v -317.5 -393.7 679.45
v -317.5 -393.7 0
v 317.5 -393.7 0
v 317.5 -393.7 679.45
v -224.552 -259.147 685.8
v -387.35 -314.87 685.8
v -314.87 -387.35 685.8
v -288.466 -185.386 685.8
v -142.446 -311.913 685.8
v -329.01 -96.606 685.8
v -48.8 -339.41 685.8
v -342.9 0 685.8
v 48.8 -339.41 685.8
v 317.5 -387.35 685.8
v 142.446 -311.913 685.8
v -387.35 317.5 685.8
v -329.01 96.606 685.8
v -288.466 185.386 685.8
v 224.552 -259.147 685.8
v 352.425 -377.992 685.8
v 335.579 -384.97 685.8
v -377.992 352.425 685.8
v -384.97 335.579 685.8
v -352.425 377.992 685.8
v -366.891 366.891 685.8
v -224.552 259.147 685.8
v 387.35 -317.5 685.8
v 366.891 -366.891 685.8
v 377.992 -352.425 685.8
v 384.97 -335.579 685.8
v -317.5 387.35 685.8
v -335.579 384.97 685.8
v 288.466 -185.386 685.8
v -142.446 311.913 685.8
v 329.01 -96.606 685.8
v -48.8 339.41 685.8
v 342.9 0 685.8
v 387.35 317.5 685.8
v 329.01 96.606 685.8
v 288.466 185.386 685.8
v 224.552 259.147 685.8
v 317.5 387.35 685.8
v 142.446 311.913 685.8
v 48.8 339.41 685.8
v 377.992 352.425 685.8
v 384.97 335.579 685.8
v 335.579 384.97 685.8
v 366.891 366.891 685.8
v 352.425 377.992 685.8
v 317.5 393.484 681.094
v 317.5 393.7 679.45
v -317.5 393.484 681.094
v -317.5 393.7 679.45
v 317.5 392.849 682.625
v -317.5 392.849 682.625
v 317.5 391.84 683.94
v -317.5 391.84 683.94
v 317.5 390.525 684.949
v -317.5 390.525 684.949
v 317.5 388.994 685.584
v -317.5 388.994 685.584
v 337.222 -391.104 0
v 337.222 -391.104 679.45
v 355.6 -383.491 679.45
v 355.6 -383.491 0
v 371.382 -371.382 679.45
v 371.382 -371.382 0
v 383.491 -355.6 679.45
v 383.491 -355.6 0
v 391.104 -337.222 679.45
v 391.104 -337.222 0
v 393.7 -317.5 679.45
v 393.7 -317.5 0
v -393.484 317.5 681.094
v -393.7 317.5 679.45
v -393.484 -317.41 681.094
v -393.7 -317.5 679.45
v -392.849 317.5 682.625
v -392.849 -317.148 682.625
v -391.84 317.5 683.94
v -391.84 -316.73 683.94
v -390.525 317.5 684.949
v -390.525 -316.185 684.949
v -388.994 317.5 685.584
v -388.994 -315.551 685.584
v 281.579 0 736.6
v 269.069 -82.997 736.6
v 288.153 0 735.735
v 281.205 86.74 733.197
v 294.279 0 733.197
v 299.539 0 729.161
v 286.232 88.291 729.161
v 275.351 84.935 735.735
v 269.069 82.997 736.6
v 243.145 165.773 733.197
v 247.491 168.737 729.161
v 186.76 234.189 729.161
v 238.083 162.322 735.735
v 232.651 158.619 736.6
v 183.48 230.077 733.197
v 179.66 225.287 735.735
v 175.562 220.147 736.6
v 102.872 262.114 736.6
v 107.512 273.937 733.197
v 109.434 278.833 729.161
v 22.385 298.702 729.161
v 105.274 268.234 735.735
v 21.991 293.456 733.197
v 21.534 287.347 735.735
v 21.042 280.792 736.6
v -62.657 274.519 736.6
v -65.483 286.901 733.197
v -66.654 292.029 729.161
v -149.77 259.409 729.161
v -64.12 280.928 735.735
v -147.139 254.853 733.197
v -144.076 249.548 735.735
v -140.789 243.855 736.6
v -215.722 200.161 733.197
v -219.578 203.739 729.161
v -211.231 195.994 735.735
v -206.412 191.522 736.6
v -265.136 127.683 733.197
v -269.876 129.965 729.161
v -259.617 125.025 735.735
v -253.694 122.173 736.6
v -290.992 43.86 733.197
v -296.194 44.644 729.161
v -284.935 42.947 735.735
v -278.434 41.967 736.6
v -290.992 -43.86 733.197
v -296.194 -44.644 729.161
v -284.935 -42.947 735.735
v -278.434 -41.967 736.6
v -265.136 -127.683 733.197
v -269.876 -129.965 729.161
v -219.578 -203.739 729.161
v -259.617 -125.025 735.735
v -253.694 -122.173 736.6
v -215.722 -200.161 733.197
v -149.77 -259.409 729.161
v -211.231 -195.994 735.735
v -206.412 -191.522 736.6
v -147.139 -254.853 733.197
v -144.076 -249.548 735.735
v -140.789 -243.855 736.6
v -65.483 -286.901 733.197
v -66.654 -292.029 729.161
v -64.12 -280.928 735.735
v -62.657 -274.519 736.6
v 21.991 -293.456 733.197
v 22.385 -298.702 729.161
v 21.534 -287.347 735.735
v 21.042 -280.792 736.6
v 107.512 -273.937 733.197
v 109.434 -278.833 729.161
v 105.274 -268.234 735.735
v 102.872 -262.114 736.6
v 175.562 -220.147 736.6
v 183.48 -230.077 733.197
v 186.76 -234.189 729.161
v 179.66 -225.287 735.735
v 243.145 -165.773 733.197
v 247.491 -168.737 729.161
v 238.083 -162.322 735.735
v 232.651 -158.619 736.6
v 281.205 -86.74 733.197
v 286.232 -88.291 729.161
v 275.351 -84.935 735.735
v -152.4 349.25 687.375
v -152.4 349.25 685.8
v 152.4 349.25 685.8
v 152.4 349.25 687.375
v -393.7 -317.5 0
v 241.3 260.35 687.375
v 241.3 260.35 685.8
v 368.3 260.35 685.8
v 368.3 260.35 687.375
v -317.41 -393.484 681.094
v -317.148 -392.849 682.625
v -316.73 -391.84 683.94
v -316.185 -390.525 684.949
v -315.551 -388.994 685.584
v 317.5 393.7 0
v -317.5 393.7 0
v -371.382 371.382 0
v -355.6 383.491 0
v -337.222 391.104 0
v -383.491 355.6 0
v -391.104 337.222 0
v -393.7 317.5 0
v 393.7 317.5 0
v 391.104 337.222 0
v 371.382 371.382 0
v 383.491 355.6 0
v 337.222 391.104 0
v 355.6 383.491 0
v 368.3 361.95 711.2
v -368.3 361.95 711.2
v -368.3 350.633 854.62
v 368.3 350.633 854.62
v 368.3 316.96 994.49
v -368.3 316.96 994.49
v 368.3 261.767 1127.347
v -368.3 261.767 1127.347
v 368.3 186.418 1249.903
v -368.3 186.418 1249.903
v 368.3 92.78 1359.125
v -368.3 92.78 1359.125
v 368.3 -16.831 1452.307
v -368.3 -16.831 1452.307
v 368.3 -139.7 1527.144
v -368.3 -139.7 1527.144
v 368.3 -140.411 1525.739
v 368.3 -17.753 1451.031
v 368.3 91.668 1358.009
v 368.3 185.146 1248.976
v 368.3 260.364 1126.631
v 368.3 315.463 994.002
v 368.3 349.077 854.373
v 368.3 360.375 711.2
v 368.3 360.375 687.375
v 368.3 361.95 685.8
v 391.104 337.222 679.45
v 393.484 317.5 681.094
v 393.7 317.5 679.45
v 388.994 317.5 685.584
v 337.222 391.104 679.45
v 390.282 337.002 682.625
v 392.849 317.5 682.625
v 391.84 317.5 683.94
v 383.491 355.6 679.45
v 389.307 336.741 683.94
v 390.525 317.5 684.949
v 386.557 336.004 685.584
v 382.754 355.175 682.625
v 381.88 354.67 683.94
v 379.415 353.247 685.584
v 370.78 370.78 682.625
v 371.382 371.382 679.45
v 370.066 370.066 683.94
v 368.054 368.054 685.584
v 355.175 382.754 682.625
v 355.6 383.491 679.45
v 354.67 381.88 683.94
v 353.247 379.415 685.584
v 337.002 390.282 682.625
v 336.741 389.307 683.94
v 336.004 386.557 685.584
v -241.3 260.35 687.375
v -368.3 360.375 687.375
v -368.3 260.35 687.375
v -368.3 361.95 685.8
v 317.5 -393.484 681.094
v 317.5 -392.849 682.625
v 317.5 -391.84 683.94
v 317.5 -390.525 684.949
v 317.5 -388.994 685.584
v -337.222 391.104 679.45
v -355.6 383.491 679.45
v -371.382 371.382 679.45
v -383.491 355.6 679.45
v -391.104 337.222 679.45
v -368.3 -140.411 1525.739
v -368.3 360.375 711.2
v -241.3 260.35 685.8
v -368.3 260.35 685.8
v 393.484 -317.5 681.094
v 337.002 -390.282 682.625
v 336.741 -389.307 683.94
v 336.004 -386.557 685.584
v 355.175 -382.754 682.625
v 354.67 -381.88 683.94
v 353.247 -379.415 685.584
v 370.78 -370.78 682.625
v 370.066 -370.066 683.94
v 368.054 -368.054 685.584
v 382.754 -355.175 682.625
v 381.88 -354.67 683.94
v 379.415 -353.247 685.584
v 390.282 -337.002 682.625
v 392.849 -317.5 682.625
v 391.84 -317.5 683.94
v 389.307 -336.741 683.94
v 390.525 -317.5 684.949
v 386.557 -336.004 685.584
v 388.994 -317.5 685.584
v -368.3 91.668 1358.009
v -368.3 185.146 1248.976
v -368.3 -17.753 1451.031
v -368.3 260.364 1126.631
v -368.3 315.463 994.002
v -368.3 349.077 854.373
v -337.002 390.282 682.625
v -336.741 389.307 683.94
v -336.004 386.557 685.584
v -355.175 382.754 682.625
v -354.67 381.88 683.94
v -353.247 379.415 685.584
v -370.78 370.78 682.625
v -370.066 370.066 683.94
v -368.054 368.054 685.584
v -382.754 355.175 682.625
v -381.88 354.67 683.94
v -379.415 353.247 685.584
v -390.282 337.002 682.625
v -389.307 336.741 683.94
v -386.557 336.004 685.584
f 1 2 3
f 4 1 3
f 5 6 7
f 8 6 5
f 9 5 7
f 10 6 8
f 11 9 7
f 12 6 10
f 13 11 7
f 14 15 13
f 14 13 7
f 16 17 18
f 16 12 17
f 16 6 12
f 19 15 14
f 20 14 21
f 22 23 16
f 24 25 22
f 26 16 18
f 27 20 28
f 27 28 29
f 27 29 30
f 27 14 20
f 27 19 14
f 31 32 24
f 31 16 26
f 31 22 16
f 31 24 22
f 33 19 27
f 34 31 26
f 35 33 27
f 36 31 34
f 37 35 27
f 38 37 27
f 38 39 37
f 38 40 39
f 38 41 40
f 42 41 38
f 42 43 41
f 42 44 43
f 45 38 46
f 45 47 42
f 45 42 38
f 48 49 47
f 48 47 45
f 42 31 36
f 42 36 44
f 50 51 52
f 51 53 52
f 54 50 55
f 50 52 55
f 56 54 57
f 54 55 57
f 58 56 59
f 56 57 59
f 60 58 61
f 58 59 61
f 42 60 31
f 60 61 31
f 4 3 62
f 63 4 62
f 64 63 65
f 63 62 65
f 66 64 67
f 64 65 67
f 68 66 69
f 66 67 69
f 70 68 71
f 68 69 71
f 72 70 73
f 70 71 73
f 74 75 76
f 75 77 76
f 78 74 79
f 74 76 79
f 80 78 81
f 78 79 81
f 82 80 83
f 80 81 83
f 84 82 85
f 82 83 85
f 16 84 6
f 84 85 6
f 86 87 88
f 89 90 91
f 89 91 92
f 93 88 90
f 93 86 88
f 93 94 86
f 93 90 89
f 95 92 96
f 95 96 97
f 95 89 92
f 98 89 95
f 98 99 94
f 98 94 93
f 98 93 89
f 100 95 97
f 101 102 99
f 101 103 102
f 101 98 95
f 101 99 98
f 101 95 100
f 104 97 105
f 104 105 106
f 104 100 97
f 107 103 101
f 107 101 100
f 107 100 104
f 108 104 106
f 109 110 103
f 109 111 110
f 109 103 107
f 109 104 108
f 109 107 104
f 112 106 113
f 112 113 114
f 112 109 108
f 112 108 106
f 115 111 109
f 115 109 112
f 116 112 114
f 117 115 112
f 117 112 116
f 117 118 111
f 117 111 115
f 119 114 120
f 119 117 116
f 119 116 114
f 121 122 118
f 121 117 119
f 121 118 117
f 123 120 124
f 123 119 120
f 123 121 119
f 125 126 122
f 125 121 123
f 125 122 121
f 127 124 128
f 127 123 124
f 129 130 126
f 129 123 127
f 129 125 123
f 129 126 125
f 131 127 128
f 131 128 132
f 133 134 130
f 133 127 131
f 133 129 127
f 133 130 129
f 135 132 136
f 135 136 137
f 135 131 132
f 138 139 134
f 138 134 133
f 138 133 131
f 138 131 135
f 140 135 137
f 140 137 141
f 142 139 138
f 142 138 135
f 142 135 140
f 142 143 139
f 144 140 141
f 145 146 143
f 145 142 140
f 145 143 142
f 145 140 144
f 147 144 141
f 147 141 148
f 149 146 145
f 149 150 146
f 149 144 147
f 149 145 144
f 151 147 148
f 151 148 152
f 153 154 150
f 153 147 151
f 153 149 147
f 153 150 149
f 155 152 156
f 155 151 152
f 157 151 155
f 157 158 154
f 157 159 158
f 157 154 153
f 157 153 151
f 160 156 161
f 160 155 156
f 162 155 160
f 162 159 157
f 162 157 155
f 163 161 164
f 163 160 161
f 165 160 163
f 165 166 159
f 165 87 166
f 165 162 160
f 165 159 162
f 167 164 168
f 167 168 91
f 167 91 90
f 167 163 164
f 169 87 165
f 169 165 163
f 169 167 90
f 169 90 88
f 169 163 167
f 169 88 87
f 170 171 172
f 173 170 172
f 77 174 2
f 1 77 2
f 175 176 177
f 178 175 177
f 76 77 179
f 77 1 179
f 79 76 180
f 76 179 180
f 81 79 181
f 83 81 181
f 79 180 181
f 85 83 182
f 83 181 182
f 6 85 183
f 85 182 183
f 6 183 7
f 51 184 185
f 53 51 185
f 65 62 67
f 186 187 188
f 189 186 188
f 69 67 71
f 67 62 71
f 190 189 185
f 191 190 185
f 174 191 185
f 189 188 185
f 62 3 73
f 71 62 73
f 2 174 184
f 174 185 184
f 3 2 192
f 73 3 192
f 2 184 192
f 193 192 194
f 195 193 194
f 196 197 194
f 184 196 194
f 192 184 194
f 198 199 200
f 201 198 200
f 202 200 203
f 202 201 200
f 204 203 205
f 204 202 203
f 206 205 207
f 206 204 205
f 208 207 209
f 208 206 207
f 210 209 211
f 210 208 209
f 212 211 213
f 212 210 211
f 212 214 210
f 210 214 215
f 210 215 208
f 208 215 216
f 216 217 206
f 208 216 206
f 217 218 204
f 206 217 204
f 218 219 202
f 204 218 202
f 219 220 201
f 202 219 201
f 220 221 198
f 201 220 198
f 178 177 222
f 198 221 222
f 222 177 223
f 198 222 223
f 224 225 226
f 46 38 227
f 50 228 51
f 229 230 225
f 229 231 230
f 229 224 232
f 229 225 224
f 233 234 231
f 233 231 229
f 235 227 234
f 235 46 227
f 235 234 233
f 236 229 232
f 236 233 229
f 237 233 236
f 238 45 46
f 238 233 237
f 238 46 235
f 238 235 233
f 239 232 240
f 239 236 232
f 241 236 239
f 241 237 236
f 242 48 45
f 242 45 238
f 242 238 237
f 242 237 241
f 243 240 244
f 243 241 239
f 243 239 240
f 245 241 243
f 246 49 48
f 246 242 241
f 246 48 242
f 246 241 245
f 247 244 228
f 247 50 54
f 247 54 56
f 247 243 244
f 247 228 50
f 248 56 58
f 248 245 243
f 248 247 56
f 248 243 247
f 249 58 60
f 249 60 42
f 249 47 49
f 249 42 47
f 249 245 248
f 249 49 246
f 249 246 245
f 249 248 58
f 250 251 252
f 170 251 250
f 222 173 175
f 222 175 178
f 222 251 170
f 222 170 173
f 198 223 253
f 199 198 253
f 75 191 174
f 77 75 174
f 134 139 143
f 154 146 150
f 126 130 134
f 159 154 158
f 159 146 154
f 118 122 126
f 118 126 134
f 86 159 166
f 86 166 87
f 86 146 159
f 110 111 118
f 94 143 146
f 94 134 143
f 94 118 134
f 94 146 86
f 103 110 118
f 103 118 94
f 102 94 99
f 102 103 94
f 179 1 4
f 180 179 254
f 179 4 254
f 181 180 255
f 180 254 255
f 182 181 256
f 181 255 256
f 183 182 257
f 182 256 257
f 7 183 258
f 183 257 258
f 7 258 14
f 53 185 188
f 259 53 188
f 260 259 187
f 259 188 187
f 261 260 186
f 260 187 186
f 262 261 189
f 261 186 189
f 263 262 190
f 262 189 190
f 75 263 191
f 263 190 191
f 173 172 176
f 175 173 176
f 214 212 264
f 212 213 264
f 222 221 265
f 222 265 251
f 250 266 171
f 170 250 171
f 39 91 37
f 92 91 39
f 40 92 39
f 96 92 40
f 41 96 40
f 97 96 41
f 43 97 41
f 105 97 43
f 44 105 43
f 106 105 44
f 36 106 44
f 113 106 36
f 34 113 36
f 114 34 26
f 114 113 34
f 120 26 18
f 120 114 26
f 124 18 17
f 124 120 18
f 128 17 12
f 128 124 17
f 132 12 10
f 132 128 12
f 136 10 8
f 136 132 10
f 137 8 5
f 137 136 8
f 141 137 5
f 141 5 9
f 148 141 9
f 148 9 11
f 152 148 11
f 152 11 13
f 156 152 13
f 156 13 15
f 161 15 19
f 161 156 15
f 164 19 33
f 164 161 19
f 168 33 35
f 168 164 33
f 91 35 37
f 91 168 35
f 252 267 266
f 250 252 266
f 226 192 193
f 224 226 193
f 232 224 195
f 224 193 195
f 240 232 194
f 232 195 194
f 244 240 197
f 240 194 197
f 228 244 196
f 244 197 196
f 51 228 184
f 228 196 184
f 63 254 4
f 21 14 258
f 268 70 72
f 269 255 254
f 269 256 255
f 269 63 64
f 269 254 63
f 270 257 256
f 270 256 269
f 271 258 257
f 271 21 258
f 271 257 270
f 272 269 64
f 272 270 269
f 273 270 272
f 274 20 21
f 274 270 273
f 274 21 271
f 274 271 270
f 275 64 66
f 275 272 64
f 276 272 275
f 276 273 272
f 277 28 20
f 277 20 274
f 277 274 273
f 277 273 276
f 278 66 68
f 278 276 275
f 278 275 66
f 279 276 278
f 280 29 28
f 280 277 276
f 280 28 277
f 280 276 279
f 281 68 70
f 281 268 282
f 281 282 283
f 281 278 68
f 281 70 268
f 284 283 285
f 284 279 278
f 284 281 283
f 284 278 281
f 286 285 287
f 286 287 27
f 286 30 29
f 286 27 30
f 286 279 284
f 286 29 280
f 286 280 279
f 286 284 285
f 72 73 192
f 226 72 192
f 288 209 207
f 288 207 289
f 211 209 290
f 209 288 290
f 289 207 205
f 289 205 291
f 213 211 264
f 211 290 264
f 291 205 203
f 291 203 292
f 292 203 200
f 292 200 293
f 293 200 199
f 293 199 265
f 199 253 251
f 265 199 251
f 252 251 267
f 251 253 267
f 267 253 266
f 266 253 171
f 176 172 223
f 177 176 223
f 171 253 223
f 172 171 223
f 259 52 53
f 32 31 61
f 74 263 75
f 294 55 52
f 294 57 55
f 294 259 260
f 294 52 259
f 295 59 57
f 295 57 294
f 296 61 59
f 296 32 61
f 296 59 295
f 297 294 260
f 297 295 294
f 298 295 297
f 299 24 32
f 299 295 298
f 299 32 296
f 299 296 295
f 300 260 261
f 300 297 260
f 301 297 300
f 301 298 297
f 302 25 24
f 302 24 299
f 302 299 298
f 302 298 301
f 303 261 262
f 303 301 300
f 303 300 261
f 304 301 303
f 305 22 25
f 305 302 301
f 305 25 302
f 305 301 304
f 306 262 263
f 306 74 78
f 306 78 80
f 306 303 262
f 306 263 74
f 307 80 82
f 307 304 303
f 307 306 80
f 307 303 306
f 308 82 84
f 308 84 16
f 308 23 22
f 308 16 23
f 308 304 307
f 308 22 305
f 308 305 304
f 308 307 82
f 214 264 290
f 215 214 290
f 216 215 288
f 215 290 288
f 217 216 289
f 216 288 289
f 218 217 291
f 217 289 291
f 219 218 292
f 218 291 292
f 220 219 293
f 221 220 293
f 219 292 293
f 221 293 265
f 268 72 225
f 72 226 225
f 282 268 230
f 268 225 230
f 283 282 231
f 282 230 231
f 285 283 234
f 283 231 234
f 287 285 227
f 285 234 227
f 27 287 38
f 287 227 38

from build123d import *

# Parameters (mm, degrees)
F1_DEPTH      = 685.8
F4_R          = 6.35
F5_R          = 25.4
F7_DEPTH      = 1.5748
F9_DEPTH      = 368.3
F9_DEPTH_BACK = 368.3


with BuildPart() as f1:
    # F0 (on Top) → F1 (new body)
    with BuildSketch(Plane.XY):
        with BuildLine():
            Line((-317.5, -393.7), (317.5, -393.7))
            ThreePointArc((317.5, -393.7), (371.3815367264, -371.3815367264), (393.7, -317.5))
            Line((393.7, -317.5), (393.7, 317.5))
            ThreePointArc((393.7, 317.5), (371.3815367264, 371.3815367264), (317.5, 393.7))
            Line((317.5, 393.7), (-317.5, 393.7))
            ThreePointArc((-317.5, 393.7), (-371.3815367264, 371.3815367264), (-393.7, 317.5))
            Line((-393.7, 317.5), (-393.7, -317.5))
            Line((-393.7, -317.5), (-317.5, -393.7))
        make_face()
    extrude(amount=F1_DEPTH)

    # F2 (on Front) → F3 (revolve)
    with BuildSketch(Plane.XZ):
        Polygon((292.1, 736.6), (0, 736.6), (0, 685.8), (342.9, 685.8), align=None)
    revolve(axis=Axis((0, 0, 685.3453814983), (0, 0, 1)))

    # F4
    f4_edges = [f1.edges().sort_by_distance(p)[0] for p in [
        (371.381537, -371.381537, 685.8),
        (-355.6, -355.6, 685.8),
    ]]
    fillet(f4_edges, radius=F4_R)

    # F5
    f5_edges = [f1.edges().sort_by_distance(p)[0] for p in [
        (-292.1, 0, 736.6),
    ]]
    fillet(f5_edges, radius=F5_R)


with BuildPart() as f7:
    # F6 (on face) → F7 (new body)
    with BuildSketch(Plane.XY.offset(685.8)):
        Polygon((152.4, 349.25), (241.3, 260.35), (368.3, 260.35), (368.3, 361.95), (-368.3, 361.95), (-368.3, 260.35), (-241.3, 260.35), (-152.4, 349.25), align=None)
    extrude(amount=F7_DEPTH)

    # F8 (on Right) → F9 (join, two sides)
    with BuildSketch(Plane.YZ) as f9_sk:
        with BuildLine():
            Line((360.3752, 685.8), (361.95, 685.8))
            Line((361.95, 685.8), (361.95, 711.2))
            ThreePointArc((361.95, 711.2), (226.5063402399, 1190.1095739281), (-139.7, 1527.1441142015))
            Line((-139.7, 1527.1441142015), (-140.4108472222, 1525.7388771159))
            ThreePointArc((-140.4108472222, 1525.7388771159), (225.1648043206, 1189.2847852175), (360.3752, 711.2))
            Line((360.3752, 711.2), (360.3752, 685.8))
        make_face()
    extrude(amount=F9_DEPTH)
    extrude(f9_sk.sketch, amount=-F9_DEPTH_BACK)


solid = Compound([f1.part, f7.part])
